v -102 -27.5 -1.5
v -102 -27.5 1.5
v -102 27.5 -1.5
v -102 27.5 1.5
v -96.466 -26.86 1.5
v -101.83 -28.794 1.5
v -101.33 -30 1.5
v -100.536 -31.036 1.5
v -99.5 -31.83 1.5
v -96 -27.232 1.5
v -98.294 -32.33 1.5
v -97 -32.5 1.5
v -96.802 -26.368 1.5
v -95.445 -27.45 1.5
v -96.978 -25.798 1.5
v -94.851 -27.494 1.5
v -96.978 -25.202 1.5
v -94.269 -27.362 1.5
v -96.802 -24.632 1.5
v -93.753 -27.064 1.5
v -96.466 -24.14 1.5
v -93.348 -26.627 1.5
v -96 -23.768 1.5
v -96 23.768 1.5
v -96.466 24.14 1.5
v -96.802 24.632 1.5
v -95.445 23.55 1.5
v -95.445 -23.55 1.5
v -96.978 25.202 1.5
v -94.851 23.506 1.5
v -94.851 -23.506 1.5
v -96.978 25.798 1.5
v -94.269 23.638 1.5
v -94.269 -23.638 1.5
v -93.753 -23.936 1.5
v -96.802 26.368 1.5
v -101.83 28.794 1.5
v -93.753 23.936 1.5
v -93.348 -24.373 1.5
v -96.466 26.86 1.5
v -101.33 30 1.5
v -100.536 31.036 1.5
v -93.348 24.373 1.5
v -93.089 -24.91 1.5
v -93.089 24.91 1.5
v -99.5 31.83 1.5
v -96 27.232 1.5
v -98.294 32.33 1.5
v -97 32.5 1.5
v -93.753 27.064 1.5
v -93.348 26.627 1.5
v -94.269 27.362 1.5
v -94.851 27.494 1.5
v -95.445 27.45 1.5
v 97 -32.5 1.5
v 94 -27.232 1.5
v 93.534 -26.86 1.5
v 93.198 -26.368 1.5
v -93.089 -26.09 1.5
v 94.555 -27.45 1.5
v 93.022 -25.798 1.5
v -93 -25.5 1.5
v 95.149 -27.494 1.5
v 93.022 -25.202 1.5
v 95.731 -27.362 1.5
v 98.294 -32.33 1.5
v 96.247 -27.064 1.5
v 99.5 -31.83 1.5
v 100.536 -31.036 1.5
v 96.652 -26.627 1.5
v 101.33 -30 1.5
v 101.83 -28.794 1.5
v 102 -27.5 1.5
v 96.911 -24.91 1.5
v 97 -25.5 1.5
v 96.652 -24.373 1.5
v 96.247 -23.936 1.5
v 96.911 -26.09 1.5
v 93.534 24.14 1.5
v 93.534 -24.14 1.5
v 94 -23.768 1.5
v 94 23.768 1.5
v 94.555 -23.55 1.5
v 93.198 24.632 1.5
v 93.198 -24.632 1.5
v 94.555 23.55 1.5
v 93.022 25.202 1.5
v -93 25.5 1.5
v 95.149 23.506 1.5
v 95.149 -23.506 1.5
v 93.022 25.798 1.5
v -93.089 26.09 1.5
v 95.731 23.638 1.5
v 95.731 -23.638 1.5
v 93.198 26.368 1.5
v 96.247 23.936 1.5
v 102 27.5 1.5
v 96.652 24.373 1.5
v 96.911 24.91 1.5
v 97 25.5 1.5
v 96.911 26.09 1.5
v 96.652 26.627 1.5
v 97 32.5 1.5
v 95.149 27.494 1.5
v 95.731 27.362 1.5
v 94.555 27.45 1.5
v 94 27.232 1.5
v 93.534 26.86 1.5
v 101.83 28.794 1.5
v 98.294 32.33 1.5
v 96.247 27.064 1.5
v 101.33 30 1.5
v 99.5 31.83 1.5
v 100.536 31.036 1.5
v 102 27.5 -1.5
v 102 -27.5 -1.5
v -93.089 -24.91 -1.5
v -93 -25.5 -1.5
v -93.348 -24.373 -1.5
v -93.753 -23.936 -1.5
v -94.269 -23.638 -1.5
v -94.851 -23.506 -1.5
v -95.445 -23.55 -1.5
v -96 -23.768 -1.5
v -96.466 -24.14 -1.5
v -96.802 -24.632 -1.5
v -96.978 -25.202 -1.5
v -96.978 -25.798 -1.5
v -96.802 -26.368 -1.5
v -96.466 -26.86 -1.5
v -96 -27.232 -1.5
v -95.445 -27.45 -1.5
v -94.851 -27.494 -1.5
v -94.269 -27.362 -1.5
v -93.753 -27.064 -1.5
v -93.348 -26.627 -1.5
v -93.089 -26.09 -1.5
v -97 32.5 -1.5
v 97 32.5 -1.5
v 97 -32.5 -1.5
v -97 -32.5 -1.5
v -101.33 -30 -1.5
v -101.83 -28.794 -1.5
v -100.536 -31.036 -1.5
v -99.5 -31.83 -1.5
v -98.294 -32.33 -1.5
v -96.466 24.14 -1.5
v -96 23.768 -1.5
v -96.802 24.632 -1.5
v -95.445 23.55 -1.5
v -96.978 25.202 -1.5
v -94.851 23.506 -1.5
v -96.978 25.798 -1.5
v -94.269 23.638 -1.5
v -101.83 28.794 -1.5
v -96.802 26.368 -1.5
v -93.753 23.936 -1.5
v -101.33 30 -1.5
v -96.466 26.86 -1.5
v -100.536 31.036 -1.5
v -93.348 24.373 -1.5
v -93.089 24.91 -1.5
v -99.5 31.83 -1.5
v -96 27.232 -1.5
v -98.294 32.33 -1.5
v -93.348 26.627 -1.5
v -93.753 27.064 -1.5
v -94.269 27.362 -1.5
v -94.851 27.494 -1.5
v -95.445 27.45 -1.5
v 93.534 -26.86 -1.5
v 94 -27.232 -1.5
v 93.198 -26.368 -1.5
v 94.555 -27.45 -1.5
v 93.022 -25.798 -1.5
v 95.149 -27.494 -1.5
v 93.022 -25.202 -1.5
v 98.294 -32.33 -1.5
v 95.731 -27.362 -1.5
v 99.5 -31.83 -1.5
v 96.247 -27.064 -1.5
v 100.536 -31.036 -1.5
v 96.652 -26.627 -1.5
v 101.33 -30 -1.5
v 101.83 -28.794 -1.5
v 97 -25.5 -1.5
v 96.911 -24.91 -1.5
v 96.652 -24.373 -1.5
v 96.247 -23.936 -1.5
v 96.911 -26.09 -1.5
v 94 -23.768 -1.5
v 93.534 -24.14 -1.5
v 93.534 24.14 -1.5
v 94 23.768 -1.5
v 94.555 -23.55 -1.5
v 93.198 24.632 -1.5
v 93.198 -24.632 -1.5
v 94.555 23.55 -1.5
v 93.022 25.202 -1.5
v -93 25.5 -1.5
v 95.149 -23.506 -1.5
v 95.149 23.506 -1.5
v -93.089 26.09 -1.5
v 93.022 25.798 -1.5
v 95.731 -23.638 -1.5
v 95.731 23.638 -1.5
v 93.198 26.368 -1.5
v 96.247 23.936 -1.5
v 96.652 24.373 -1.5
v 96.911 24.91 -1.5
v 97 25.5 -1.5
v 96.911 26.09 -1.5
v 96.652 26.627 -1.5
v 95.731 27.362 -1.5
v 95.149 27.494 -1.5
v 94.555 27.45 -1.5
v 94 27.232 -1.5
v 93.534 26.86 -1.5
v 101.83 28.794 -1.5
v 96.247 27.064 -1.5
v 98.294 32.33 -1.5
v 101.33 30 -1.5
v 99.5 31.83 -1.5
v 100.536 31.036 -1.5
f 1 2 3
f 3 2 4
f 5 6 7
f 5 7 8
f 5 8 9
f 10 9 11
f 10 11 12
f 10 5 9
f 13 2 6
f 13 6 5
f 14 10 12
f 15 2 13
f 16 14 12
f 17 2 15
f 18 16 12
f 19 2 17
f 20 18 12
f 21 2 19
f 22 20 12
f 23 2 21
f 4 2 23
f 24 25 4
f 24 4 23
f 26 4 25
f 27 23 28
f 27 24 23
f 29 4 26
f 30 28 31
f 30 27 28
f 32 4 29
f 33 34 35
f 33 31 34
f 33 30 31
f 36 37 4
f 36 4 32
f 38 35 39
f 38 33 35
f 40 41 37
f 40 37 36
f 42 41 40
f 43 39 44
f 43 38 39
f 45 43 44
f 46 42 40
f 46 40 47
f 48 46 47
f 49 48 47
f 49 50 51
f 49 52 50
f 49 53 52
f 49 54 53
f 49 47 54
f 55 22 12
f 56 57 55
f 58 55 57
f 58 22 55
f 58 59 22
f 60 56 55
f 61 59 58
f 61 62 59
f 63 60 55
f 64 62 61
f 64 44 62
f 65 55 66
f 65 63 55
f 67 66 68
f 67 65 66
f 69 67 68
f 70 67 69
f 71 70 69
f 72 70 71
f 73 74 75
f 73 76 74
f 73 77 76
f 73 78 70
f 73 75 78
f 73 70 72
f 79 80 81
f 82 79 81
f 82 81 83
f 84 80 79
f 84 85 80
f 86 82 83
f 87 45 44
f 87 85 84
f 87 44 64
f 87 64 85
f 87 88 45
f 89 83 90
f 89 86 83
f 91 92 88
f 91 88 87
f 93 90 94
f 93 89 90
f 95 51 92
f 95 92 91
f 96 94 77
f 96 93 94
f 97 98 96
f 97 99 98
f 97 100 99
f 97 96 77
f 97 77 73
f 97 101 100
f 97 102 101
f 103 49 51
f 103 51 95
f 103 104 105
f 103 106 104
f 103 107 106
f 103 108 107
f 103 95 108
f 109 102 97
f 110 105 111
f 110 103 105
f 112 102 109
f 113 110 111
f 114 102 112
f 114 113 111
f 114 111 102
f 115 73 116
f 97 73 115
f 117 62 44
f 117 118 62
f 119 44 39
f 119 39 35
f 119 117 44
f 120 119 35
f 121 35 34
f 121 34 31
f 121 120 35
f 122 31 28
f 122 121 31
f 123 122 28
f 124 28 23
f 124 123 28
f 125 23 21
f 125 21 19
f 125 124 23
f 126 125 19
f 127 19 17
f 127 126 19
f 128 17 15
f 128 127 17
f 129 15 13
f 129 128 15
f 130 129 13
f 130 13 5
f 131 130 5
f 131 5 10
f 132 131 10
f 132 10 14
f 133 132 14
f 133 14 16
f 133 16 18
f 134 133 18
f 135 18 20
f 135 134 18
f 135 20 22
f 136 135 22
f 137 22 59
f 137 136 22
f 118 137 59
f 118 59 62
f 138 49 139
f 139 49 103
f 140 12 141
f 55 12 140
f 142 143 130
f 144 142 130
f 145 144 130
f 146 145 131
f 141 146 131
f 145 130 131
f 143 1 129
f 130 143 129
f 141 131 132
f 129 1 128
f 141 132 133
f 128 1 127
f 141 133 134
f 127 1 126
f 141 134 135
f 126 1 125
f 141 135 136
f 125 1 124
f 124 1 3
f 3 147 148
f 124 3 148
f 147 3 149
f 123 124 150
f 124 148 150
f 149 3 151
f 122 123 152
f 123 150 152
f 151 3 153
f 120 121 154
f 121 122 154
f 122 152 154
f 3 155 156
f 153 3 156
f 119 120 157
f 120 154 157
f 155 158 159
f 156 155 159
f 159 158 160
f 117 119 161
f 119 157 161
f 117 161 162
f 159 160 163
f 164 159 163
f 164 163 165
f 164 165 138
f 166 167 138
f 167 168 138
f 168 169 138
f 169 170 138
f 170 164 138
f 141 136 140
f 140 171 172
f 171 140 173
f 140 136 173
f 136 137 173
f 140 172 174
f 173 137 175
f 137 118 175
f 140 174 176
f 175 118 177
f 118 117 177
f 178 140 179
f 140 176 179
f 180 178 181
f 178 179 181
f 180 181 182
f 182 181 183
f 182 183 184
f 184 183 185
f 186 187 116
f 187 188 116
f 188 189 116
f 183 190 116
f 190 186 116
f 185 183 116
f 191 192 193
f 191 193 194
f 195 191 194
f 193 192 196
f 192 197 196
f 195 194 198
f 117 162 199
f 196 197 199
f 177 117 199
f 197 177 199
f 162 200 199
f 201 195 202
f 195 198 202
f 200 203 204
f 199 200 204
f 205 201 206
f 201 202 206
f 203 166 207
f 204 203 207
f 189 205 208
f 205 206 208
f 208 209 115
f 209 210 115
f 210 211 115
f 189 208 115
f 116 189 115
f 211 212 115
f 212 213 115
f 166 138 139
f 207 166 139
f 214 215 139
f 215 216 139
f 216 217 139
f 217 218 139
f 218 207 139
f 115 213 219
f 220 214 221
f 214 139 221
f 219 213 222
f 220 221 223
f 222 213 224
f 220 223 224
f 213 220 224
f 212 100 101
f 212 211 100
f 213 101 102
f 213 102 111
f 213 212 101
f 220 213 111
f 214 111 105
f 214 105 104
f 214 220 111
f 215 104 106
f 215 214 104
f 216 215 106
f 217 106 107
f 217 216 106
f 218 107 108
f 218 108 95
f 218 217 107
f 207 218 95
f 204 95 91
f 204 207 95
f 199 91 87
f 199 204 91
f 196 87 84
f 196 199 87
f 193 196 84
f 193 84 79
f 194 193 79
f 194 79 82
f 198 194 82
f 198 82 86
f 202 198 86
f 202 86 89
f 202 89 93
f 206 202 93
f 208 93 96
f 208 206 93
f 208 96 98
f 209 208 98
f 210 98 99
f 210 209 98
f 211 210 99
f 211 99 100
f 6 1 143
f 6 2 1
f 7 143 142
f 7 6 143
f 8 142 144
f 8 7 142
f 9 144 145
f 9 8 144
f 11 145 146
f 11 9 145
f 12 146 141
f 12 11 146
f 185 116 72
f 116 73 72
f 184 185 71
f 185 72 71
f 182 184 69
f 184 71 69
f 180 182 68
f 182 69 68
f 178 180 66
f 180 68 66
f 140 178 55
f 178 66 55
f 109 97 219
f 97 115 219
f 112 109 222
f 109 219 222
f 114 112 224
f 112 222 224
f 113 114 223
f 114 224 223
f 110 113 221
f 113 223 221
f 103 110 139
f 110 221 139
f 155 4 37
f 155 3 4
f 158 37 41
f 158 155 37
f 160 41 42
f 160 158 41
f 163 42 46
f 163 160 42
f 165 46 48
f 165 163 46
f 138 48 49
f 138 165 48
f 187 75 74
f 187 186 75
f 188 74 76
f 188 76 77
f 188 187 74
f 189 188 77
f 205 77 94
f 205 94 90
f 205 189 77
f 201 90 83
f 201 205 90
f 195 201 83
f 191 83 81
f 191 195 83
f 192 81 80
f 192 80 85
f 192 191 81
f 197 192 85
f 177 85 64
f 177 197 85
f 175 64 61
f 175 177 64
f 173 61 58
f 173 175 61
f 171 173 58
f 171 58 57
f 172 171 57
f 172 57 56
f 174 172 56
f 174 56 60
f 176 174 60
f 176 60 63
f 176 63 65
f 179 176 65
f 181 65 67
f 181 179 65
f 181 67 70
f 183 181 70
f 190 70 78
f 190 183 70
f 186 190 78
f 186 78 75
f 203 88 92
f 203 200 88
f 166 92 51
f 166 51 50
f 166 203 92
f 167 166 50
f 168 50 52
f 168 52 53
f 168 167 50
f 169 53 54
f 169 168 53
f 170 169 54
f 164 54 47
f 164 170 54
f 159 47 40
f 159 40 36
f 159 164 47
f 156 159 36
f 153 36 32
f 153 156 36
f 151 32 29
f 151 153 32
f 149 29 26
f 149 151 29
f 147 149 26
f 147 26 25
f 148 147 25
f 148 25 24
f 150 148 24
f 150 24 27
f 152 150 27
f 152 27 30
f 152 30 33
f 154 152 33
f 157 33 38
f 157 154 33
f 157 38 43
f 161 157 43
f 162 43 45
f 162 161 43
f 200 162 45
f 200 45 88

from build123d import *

# Parameters (mm, degrees)
SKETCH1_W           = 204
SKETCH1_H           = 65
SKETCH1_R           = 2
BOSS_EXTRUDE1_DEPTH = 1.5
FILLET1_R           = 5


with BuildPart() as part:
    # Sketch1 → Boss-Extrude1 (new, symmetric)
    with BuildSketch(Plane.XY):
        Rectangle(SKETCH1_W, SKETCH1_H)
        with Locations((95, -25.5)):
            Circle(SKETCH1_R, mode=Mode.SUBTRACT)
        with Locations((95, 25.5)):
            Circle(SKETCH1_R, mode=Mode.SUBTRACT)
        with Locations((-95, 25.5)):
            Circle(SKETCH1_R, mode=Mode.SUBTRACT)
        with Locations((-95, -25.5)):
            Circle(SKETCH1_R, mode=Mode.SUBTRACT)
    extrude(amount=BOSS_EXTRUDE1_DEPTH, both=True)

    # Fillet1
    fillet1_edges = [part.edges().sort_by_distance(p)[0] for p in [
        (102, -32.5, 0),
        (-102, -32.5, 0),
        (-102, 32.5, 0),
        (102, 32.5, 0),
    ]]
    fillet(fillet1_edges, radius=FILLET1_R)


solid = part.part
